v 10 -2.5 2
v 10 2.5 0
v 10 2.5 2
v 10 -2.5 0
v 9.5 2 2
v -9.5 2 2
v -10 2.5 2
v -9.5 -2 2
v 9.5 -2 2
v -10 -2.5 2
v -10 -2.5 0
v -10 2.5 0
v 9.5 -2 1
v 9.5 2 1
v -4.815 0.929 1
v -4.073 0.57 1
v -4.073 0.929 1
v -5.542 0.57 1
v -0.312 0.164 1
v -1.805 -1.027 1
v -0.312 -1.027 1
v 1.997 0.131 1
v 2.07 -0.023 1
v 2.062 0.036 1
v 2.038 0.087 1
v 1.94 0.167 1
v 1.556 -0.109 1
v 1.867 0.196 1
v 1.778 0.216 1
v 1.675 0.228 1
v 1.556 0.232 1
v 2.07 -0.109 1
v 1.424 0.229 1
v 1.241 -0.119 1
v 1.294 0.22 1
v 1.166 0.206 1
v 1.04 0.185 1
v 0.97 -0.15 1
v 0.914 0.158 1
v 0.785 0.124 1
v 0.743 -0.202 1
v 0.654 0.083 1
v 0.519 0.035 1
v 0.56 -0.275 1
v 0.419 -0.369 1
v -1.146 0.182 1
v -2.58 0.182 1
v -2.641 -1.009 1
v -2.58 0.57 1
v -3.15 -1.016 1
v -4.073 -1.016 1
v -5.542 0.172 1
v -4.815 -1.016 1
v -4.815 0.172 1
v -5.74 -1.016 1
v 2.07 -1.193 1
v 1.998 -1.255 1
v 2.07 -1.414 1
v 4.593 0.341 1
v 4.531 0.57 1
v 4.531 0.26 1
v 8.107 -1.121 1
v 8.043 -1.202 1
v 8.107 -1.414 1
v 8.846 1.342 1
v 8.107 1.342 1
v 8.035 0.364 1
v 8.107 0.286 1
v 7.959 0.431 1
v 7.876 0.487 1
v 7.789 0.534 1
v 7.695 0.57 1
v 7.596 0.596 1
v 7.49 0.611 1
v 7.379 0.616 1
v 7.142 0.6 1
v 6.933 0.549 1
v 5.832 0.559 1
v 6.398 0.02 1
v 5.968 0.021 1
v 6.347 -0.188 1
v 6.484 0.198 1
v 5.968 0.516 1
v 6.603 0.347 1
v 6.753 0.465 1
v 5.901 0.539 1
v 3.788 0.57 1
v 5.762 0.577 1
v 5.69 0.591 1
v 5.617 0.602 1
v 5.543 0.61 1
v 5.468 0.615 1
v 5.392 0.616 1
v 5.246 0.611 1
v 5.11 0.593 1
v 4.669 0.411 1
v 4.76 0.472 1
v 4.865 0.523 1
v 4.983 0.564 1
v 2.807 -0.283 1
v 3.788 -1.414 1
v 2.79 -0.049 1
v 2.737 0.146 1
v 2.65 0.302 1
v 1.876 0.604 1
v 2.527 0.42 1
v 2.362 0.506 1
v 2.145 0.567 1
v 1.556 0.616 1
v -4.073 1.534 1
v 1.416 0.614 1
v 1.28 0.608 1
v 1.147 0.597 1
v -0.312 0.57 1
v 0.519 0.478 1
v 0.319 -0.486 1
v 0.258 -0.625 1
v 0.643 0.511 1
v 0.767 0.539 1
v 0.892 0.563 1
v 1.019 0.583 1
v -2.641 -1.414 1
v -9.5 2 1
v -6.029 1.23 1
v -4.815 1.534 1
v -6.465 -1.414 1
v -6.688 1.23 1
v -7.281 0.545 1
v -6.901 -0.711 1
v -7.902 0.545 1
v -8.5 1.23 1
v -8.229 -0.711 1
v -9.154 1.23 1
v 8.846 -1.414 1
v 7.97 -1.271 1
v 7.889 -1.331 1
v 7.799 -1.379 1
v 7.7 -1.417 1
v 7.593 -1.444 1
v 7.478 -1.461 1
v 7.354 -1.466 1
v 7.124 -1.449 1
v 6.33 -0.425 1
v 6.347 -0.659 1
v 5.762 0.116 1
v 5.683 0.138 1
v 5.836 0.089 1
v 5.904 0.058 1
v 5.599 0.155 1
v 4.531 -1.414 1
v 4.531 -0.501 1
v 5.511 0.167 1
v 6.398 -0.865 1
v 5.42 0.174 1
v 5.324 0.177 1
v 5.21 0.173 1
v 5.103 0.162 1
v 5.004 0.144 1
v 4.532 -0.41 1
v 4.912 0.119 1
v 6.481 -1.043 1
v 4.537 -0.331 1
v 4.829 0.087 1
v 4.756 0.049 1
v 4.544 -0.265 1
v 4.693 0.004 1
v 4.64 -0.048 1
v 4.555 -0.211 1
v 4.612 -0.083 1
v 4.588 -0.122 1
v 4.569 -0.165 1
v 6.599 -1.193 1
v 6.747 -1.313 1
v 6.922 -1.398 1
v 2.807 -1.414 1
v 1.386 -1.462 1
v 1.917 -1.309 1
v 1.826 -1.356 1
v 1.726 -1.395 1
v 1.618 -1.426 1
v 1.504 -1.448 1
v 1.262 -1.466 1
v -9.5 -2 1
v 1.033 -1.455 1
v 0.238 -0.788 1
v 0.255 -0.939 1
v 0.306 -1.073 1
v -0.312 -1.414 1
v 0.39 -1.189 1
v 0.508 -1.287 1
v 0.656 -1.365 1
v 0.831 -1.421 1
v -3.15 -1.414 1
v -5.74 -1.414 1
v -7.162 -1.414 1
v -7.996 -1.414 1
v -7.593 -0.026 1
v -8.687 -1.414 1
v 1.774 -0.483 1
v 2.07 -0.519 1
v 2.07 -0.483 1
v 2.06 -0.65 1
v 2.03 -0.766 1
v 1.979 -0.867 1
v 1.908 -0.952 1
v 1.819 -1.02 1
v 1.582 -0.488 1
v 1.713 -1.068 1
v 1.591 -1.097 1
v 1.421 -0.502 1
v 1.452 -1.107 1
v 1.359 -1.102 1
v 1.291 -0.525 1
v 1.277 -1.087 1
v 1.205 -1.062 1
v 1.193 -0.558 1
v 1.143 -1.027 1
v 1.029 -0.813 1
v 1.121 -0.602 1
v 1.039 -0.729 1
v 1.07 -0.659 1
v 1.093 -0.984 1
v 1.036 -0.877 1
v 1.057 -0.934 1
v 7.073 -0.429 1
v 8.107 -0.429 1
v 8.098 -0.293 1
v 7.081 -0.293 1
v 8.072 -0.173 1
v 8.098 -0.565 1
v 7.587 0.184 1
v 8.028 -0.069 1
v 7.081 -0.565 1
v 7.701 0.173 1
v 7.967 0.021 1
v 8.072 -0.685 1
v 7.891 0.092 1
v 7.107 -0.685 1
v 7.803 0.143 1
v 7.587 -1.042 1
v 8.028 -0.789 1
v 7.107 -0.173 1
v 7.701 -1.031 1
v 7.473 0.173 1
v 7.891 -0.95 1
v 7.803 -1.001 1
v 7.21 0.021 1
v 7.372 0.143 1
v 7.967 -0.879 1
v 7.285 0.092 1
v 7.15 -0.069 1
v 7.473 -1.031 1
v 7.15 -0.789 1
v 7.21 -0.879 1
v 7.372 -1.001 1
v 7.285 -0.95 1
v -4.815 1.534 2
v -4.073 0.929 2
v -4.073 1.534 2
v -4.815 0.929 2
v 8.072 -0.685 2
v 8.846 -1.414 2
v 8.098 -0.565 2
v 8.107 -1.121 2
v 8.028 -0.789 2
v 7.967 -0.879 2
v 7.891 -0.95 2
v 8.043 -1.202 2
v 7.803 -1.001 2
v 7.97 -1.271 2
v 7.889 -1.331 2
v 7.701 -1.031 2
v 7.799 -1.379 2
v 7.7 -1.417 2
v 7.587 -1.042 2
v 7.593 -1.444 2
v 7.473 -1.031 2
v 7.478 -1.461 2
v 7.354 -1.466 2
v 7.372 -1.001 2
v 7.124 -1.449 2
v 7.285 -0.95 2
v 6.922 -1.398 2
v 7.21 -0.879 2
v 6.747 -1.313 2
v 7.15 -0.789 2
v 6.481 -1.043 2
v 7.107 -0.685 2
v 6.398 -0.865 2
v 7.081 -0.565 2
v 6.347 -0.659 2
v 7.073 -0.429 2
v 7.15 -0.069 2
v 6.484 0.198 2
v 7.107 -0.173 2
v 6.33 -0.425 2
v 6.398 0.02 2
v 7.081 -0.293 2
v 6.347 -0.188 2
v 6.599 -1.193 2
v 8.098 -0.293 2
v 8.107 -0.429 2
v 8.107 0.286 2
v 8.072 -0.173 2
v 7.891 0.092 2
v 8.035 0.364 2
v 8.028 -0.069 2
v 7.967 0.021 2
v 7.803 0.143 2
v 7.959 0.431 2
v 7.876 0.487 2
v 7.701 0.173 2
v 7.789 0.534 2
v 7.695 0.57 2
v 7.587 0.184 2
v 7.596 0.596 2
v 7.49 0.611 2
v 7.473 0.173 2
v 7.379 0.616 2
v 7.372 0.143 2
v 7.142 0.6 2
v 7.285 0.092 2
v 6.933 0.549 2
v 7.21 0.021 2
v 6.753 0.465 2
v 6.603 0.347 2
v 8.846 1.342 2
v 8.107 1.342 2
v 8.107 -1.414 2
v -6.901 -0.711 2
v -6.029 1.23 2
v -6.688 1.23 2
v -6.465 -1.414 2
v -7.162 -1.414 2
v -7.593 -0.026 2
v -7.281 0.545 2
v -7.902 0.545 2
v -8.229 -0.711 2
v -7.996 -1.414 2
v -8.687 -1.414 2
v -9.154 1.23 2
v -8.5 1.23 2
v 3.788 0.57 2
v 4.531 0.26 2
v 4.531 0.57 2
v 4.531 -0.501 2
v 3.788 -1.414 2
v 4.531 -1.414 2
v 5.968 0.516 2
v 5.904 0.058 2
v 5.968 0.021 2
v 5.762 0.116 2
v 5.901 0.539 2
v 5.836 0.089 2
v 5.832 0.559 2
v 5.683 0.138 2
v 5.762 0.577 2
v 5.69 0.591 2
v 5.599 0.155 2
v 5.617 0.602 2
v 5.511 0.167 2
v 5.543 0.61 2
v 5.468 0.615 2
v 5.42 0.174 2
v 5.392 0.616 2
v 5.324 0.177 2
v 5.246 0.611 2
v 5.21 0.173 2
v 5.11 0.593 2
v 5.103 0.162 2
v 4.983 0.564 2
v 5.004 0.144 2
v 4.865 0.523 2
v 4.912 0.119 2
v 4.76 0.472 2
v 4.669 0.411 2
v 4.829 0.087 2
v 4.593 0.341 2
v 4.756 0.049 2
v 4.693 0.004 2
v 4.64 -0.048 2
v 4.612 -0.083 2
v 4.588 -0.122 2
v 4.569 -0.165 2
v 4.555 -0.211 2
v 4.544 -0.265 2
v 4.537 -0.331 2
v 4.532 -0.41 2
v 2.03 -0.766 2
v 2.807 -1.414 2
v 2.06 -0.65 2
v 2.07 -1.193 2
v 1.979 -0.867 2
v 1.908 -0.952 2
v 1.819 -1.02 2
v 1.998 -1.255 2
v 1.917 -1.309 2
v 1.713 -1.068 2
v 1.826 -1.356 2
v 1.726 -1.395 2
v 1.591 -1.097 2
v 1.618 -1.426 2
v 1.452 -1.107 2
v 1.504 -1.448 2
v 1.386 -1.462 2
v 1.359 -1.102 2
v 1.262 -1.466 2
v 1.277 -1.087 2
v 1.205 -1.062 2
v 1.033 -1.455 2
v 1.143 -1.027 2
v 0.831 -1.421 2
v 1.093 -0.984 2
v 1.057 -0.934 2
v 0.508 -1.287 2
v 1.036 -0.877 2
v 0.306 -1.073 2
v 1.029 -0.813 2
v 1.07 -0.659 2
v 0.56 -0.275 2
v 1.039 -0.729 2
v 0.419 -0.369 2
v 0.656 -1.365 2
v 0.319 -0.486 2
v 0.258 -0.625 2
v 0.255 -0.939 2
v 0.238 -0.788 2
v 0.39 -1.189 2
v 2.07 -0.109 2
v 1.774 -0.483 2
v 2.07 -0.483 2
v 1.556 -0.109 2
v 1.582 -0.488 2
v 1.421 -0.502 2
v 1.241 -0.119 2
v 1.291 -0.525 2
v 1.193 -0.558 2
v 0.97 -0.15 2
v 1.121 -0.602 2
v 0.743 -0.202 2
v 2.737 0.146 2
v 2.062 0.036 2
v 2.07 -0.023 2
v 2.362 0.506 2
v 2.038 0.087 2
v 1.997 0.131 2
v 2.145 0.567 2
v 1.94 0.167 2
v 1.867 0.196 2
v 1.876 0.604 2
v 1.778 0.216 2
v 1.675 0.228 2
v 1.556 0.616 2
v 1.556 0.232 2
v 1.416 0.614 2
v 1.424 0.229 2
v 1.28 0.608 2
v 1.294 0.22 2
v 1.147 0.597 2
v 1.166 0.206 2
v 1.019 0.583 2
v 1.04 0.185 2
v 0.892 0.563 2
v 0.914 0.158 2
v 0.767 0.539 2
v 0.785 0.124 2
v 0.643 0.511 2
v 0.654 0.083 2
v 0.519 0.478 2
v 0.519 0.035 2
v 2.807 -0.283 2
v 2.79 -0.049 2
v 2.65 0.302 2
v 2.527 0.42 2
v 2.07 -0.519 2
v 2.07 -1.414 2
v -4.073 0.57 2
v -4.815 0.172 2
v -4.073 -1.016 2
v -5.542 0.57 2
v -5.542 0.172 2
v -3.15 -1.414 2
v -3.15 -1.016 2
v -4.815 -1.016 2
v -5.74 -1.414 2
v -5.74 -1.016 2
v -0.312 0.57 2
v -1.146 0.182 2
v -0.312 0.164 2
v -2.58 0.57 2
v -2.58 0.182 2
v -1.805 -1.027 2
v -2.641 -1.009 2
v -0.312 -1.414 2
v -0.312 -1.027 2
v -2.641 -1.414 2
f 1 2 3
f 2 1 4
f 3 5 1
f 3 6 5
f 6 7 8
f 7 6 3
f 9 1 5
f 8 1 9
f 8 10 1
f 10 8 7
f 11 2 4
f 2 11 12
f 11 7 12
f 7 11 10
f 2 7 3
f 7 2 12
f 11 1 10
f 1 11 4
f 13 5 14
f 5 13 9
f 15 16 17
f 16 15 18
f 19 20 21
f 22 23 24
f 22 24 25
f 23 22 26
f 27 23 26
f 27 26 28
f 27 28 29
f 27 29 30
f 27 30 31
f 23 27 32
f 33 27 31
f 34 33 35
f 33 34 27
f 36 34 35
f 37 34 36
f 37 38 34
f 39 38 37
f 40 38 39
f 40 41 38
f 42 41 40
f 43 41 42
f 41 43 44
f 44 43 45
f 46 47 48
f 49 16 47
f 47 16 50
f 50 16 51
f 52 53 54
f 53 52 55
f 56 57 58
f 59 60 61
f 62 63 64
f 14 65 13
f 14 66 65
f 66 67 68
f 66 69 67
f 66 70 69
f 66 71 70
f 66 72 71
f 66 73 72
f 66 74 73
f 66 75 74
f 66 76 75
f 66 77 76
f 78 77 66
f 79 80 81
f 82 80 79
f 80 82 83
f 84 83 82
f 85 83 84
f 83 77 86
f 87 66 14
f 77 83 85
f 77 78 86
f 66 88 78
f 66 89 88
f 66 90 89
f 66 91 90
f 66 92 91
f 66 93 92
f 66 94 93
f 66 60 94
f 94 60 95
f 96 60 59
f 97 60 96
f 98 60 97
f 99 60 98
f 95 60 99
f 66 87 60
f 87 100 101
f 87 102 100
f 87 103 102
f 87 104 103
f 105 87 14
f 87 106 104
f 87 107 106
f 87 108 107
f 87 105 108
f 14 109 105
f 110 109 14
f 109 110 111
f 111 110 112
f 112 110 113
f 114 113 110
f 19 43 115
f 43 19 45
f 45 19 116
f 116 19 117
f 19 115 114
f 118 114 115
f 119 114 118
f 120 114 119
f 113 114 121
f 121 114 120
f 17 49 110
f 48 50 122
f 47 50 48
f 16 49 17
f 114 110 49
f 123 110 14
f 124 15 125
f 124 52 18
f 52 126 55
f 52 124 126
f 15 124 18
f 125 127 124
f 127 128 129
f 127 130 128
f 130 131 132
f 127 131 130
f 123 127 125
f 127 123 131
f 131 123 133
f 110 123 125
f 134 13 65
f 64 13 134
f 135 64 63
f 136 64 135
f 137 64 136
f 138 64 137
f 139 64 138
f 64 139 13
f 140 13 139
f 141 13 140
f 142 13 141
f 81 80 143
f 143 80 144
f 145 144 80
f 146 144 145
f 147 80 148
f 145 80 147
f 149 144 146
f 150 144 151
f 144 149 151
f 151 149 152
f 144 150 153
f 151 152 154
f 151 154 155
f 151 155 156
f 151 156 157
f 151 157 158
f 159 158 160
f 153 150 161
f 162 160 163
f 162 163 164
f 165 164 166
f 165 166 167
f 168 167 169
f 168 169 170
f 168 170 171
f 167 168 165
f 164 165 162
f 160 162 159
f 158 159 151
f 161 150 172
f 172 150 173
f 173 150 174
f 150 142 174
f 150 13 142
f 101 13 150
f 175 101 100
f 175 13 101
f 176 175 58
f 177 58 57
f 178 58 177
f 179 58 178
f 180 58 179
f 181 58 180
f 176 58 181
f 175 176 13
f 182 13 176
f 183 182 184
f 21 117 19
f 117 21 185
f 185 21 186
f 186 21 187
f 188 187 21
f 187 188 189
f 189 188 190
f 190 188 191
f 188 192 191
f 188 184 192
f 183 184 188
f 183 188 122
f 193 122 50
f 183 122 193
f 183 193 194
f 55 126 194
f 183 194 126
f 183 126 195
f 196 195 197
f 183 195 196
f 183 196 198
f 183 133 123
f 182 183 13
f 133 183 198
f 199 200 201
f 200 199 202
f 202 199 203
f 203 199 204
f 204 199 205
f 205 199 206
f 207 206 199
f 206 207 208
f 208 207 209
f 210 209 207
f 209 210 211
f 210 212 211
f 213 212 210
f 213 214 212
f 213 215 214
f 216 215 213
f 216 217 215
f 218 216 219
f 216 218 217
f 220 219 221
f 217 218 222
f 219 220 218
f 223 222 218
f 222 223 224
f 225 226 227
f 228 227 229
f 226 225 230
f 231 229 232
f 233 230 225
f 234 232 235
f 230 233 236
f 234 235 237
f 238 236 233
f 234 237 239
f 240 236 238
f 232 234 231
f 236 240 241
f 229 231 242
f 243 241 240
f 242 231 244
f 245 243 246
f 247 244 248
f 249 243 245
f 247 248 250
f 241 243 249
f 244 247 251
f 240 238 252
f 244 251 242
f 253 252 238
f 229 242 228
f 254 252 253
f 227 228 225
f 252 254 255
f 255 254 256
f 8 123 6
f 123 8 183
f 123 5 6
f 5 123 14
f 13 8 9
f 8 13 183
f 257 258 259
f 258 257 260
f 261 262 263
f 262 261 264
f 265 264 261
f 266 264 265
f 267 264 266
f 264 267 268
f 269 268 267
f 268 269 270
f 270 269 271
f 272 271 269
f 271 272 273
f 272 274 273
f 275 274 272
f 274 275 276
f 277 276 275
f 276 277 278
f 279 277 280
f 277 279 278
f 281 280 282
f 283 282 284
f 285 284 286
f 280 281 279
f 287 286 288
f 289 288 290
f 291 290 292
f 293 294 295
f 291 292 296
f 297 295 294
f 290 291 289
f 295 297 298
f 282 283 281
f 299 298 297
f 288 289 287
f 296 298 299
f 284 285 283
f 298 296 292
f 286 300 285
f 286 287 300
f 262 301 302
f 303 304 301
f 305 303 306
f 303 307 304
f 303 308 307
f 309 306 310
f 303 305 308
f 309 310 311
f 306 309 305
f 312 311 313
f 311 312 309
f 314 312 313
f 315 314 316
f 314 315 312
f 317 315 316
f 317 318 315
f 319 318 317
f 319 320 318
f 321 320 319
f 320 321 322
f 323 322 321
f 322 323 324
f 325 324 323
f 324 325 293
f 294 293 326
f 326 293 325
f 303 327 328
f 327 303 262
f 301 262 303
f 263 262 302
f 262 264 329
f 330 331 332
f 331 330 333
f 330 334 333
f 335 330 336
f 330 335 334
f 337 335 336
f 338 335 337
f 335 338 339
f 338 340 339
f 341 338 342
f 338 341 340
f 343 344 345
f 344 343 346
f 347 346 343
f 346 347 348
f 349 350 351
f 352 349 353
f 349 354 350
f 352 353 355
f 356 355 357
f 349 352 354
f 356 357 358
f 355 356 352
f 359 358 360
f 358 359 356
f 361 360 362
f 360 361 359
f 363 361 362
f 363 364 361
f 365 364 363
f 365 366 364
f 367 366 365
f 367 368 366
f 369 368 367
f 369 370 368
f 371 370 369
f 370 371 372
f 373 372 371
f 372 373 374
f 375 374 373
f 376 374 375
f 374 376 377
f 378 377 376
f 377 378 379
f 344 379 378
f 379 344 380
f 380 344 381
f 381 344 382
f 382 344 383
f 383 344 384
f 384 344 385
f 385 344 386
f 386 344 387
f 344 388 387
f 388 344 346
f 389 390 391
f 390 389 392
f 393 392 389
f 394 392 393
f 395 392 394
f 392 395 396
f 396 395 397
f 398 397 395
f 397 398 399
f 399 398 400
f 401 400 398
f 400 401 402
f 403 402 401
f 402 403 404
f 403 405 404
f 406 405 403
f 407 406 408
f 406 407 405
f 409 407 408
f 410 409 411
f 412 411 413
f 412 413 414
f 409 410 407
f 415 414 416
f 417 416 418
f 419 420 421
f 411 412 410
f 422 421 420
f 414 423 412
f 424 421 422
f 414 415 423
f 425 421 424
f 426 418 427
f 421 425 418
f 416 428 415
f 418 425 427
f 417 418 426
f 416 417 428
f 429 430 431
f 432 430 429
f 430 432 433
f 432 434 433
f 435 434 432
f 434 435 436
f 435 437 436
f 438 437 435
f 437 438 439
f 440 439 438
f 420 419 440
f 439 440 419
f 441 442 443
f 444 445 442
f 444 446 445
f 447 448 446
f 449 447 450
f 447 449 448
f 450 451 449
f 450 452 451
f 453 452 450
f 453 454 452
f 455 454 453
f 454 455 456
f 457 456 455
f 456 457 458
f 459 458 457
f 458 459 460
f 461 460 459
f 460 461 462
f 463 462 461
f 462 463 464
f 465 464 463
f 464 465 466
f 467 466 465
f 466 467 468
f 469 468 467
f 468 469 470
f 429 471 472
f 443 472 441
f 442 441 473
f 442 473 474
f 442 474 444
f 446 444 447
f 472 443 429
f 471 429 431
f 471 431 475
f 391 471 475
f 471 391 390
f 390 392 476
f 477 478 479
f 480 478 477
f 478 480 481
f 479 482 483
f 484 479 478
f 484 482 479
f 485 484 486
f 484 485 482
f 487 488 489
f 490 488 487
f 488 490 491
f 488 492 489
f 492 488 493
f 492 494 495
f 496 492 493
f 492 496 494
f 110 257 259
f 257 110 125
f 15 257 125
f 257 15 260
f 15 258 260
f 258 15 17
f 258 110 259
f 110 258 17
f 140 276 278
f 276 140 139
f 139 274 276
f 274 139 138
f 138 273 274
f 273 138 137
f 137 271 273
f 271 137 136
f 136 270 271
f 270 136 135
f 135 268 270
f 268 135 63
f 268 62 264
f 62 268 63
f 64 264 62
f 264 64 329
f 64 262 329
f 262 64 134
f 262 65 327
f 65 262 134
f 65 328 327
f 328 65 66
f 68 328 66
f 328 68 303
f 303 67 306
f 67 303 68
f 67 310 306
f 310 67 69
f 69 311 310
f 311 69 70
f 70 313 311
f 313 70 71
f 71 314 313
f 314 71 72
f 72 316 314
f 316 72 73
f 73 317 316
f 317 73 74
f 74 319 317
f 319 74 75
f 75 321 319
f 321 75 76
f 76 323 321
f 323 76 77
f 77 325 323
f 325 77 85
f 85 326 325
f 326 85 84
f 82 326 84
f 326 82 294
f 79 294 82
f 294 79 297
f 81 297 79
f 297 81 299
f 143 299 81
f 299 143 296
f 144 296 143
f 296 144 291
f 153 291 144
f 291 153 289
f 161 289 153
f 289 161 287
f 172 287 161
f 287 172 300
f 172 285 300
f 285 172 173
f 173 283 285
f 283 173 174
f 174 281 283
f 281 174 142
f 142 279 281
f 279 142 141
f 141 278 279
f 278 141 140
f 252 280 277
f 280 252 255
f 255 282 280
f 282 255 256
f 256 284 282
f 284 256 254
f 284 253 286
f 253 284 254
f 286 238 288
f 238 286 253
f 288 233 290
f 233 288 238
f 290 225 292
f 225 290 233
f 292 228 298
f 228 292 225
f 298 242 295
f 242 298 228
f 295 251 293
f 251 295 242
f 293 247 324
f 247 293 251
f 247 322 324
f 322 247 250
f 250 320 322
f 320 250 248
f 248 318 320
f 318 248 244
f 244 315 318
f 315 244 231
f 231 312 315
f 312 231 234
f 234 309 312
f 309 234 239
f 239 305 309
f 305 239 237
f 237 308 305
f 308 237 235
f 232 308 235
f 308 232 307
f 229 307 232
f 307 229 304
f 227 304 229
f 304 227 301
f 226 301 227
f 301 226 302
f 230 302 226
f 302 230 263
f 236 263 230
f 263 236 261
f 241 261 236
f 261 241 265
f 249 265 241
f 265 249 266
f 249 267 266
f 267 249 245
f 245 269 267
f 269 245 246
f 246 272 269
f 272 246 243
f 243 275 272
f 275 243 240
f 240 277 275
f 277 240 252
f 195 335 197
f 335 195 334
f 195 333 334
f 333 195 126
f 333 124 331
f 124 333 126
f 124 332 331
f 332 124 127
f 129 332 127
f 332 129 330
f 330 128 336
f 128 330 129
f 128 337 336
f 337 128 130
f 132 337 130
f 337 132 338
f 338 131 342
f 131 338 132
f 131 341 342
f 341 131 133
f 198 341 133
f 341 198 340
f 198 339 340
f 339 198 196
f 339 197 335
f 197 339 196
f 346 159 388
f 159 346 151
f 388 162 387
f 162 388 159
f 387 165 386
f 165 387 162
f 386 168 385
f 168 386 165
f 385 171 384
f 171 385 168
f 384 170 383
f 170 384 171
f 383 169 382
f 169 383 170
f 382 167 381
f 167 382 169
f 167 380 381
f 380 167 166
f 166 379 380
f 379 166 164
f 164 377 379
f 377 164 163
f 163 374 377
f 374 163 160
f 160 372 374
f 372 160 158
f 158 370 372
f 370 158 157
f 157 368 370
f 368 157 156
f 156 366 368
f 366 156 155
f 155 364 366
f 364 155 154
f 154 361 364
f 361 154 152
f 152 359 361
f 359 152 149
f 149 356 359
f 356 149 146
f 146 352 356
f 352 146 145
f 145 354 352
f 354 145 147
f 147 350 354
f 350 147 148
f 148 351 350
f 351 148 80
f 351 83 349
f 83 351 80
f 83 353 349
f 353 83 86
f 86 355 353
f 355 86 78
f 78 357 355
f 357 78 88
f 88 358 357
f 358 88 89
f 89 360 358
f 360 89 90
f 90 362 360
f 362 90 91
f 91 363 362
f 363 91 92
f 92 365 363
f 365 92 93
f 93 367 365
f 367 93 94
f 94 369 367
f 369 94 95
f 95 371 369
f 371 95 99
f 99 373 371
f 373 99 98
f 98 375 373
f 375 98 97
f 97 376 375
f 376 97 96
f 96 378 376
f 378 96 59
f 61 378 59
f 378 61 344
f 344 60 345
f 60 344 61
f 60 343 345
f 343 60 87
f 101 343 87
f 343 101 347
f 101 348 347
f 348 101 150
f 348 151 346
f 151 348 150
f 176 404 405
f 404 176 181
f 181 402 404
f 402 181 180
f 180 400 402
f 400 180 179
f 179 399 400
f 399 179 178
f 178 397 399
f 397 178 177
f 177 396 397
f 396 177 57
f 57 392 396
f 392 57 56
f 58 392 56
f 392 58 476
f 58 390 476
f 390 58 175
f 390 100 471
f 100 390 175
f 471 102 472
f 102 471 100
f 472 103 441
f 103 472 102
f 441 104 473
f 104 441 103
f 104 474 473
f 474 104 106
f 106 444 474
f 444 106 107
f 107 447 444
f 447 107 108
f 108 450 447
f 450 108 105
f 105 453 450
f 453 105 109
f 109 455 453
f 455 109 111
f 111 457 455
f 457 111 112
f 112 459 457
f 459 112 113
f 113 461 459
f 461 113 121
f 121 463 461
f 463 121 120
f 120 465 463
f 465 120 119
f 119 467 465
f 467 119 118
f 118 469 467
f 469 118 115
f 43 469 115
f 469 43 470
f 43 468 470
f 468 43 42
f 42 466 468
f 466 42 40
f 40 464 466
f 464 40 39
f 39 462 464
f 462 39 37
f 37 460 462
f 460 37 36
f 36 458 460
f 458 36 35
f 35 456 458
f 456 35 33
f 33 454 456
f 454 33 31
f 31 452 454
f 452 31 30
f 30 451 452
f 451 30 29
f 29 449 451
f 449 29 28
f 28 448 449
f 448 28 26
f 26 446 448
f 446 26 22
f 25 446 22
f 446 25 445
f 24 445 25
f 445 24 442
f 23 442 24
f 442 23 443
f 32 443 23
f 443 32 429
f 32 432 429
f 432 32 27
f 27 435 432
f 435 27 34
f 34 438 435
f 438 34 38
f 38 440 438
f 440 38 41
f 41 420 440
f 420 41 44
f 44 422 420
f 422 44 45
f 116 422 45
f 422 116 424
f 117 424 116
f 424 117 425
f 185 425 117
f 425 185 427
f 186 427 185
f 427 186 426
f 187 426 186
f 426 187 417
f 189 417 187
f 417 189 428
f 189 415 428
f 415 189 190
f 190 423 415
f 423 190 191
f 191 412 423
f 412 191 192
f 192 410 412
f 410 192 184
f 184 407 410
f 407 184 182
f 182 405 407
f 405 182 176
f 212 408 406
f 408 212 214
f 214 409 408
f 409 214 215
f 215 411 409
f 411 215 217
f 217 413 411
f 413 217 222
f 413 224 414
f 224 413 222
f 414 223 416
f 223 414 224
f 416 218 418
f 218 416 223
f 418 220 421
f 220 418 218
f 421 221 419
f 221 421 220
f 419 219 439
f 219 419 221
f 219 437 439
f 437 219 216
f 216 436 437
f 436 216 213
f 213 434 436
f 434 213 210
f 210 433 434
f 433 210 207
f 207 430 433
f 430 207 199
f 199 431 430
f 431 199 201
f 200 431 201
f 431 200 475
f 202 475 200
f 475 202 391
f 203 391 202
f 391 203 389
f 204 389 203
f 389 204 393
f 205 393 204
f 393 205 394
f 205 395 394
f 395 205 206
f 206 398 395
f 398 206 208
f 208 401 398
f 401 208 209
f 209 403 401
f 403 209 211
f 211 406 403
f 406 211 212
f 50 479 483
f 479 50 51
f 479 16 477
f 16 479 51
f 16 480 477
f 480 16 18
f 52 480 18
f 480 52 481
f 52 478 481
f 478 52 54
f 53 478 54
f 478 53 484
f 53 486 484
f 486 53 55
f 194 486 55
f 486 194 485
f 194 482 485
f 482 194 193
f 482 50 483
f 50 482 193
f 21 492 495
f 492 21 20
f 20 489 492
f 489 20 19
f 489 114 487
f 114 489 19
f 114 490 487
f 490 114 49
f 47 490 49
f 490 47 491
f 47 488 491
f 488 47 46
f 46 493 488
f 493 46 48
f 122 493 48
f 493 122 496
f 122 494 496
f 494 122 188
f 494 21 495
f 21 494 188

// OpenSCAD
/*
 *  Text counters for Magic: the Gathering
 */

/* [Label] */

label = "Wizard";

/* [Dimensions] */

width                   = 20.0; // [0.1:0.1:100.0]
height                  = 5.0;  // [0.1:0.1:100.0]
base_thickness          = 1.0;  // [0.1:0.1:100.0]
base_frame_thickness    = 0.5;  // [0.0:0.1:100.0]
label_margin            = 0.5;  // [0.1:0.1:100.0]
label_bump_height       = 1.0;  // [0.1:0.1:100.0]

/* [Hidden] */

base_plate_total_thickness = base_frame_thickness > 0.0
                           ? base_thickness + label_bump_height
                           : base_thickness;
base_plate_dim = [width, height, base_plate_total_thickness];

label_cutout_width = width - 2*base_frame_thickness;
label_cutout_height = height - 2*base_frame_thickness;
label_cutout_dim = [label_cutout_width, label_cutout_height, label_bump_height];

label_padding = base_frame_thickness + label_margin;
label_width = width - 2*label_padding;
label_height = height - 2*label_padding;
label_thickness = base_thickness + label_bump_height;
label_dim = [label_width, label_height, label_thickness];

module base_plate() {
    translate([-width/2, -height/2, 0.0]) {
        difference() {
            cube(base_plate_dim);
            translate([base_frame_thickness, base_frame_thickness, base_thickness]) {
                cube(label_cutout_dim);
            }
        }
    }
}

module label_text(str) {
    resize(label_dim) {
        linear_extrude(label_thickness) {
            text(str, 10, "FreeMono:style=Bold", halign="center", valign="center");
        }
    }
}

module text_counter(str) {
    base_plate();
    label_text(str);
}

text_counter(label);
